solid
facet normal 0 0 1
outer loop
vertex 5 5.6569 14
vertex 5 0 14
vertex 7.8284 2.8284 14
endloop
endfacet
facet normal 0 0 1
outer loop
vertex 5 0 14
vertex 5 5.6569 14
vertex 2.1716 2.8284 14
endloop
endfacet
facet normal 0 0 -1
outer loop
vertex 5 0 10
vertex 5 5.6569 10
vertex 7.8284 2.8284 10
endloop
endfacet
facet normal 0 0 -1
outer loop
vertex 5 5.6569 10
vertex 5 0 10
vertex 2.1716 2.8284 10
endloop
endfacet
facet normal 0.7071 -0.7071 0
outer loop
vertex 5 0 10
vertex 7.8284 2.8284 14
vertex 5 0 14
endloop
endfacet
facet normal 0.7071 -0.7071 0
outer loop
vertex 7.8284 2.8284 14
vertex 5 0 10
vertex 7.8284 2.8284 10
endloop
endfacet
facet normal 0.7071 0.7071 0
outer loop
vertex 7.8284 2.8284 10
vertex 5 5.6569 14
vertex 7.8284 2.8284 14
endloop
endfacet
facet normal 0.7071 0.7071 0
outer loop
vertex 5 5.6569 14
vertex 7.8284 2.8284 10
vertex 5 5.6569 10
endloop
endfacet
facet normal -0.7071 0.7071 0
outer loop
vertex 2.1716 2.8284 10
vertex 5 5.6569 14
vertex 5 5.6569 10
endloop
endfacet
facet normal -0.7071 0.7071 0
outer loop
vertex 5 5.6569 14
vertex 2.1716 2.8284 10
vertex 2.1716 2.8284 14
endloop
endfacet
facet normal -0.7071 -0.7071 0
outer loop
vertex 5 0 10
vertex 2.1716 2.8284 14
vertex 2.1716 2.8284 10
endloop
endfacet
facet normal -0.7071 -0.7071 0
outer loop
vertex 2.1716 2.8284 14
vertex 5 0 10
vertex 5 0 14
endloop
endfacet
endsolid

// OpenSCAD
// Nested transforms using children()
module up(z) {
    translate([0, 0, z]) children();
}

module right(x) {
    translate([x, 0, 0]) children();
}

module zrot(a) {
    rotate([0, 0, a]) children();
}

// Nested usage
up(10)
    right(5)
        zrot(45)
            cube(4);
